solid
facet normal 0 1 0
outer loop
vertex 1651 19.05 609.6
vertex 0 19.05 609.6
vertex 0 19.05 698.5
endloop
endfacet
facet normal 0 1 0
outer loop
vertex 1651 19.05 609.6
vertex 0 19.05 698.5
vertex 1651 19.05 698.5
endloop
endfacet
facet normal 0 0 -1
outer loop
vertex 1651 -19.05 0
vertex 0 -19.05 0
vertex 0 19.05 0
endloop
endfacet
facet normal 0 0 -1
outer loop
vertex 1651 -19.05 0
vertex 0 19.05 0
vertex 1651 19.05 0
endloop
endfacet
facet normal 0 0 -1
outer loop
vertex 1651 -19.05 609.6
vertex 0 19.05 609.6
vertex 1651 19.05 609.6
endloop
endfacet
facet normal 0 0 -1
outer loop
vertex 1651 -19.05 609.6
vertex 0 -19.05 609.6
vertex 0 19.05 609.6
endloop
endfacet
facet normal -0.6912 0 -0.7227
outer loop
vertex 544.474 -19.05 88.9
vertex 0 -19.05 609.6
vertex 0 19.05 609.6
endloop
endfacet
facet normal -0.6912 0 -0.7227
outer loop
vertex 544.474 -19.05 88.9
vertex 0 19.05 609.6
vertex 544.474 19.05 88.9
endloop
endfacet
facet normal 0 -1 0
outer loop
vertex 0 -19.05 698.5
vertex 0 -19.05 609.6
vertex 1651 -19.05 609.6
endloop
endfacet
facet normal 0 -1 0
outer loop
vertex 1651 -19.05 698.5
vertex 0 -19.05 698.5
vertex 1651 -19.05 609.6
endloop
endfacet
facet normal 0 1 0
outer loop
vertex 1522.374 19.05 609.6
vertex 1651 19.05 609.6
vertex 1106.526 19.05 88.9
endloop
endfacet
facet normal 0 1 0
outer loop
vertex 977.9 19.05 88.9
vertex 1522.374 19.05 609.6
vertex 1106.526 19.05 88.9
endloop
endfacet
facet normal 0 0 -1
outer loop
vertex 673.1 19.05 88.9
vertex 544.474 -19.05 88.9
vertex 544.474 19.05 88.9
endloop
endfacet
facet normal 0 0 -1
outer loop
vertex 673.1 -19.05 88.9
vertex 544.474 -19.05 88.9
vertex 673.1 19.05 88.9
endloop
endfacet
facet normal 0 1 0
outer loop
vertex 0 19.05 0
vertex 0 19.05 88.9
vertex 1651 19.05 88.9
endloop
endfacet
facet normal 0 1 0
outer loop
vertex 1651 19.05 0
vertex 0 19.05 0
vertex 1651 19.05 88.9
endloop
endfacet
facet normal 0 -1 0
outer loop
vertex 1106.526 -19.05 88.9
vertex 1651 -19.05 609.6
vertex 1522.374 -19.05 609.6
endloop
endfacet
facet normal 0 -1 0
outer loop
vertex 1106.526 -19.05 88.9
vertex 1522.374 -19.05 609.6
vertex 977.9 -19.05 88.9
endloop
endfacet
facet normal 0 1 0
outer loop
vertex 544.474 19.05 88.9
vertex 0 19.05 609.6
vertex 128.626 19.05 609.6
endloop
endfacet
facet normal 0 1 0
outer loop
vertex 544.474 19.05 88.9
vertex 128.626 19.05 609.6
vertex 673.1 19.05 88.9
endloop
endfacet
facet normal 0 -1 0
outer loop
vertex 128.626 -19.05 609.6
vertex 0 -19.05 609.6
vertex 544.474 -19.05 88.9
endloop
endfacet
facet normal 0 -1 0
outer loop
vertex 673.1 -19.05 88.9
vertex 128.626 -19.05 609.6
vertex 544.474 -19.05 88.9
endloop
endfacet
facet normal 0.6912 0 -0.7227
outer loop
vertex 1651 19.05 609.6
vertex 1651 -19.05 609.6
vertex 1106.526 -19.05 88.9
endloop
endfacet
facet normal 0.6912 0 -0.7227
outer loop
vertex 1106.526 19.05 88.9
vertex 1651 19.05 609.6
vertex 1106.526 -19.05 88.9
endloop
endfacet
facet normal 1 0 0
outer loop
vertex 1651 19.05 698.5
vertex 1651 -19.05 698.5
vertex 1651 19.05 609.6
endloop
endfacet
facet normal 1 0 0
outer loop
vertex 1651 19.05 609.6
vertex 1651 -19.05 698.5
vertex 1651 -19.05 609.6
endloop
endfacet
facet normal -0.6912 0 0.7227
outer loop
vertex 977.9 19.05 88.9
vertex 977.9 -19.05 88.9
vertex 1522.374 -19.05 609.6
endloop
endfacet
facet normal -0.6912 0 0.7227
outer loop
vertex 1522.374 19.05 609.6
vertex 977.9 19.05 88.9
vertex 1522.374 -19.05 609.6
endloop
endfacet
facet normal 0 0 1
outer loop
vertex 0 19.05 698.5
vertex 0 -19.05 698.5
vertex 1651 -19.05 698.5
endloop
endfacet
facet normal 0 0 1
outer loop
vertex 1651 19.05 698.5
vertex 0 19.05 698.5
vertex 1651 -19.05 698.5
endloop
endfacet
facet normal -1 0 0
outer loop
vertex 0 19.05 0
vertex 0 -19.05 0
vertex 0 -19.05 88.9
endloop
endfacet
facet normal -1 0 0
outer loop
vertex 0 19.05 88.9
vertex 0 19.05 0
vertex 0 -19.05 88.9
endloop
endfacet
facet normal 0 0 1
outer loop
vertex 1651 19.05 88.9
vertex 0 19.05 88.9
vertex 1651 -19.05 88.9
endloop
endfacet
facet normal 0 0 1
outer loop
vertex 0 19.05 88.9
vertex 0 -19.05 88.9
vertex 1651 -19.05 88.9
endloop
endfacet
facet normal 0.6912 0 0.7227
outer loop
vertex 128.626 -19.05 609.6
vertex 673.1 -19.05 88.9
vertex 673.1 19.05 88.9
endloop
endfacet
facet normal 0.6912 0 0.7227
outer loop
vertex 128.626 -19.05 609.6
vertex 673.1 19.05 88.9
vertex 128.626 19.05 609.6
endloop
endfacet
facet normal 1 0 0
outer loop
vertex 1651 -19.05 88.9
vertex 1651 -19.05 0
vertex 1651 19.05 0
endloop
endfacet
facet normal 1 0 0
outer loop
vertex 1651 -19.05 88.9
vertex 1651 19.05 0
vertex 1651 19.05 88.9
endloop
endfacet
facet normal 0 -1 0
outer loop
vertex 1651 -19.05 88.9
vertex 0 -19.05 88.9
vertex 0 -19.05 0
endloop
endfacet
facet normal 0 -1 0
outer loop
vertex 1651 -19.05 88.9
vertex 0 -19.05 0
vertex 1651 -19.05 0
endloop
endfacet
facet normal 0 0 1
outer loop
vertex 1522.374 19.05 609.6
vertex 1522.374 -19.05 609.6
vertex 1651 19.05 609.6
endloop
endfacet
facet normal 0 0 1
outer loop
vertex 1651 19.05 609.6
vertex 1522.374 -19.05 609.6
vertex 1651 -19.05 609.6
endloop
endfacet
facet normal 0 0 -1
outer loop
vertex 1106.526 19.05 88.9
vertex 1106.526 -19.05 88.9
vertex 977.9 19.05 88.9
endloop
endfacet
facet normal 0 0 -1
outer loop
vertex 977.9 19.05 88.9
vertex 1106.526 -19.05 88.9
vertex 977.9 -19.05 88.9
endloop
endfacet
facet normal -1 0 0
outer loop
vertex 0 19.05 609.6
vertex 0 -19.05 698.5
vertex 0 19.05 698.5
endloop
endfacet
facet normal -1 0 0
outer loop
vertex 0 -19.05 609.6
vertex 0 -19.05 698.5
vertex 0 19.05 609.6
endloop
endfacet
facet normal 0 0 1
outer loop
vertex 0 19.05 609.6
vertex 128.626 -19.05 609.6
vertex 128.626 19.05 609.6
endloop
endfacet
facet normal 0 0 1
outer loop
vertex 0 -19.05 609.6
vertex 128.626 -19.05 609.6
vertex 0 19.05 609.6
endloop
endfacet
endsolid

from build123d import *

# Parameters (mm, degrees)
F0_W     = 1651
F0_H     = 88.9
F1_DEPTH = 19.05
F6_DEPTH = 38.1


with BuildPart() as f1:
    # F0 (on Front) → F1 (new body, symmetric)
    with BuildSketch(Plane.XZ):
        with Locations((825.5, 44.45)):
            Rectangle(F0_W, F0_H)
    extrude(amount=F1_DEPTH, both=True)


with BuildPart() as f3_1:
    # F3: instance of F1
    add(f1.part.mirror(Plane.XY.offset(349.25)))


with BuildPart() as f6:
    # F5 (on face) → F6 (new body)
    with BuildSketch(Plane.XZ.offset(19.05)):
        Polygon((673.1, 88.9), (128.625769, 609.6), (0, 609.6), (544.474231, 88.9), align=None)
    extrude(amount=-F6_DEPTH)


with BuildPart() as f8_1:
    # F8: instance of F6
    add(f6.part.mirror(Plane.YZ.offset(825.5)))


solid = Compound([f1.part, f3_1.part, f6.part, f8_1.part])
